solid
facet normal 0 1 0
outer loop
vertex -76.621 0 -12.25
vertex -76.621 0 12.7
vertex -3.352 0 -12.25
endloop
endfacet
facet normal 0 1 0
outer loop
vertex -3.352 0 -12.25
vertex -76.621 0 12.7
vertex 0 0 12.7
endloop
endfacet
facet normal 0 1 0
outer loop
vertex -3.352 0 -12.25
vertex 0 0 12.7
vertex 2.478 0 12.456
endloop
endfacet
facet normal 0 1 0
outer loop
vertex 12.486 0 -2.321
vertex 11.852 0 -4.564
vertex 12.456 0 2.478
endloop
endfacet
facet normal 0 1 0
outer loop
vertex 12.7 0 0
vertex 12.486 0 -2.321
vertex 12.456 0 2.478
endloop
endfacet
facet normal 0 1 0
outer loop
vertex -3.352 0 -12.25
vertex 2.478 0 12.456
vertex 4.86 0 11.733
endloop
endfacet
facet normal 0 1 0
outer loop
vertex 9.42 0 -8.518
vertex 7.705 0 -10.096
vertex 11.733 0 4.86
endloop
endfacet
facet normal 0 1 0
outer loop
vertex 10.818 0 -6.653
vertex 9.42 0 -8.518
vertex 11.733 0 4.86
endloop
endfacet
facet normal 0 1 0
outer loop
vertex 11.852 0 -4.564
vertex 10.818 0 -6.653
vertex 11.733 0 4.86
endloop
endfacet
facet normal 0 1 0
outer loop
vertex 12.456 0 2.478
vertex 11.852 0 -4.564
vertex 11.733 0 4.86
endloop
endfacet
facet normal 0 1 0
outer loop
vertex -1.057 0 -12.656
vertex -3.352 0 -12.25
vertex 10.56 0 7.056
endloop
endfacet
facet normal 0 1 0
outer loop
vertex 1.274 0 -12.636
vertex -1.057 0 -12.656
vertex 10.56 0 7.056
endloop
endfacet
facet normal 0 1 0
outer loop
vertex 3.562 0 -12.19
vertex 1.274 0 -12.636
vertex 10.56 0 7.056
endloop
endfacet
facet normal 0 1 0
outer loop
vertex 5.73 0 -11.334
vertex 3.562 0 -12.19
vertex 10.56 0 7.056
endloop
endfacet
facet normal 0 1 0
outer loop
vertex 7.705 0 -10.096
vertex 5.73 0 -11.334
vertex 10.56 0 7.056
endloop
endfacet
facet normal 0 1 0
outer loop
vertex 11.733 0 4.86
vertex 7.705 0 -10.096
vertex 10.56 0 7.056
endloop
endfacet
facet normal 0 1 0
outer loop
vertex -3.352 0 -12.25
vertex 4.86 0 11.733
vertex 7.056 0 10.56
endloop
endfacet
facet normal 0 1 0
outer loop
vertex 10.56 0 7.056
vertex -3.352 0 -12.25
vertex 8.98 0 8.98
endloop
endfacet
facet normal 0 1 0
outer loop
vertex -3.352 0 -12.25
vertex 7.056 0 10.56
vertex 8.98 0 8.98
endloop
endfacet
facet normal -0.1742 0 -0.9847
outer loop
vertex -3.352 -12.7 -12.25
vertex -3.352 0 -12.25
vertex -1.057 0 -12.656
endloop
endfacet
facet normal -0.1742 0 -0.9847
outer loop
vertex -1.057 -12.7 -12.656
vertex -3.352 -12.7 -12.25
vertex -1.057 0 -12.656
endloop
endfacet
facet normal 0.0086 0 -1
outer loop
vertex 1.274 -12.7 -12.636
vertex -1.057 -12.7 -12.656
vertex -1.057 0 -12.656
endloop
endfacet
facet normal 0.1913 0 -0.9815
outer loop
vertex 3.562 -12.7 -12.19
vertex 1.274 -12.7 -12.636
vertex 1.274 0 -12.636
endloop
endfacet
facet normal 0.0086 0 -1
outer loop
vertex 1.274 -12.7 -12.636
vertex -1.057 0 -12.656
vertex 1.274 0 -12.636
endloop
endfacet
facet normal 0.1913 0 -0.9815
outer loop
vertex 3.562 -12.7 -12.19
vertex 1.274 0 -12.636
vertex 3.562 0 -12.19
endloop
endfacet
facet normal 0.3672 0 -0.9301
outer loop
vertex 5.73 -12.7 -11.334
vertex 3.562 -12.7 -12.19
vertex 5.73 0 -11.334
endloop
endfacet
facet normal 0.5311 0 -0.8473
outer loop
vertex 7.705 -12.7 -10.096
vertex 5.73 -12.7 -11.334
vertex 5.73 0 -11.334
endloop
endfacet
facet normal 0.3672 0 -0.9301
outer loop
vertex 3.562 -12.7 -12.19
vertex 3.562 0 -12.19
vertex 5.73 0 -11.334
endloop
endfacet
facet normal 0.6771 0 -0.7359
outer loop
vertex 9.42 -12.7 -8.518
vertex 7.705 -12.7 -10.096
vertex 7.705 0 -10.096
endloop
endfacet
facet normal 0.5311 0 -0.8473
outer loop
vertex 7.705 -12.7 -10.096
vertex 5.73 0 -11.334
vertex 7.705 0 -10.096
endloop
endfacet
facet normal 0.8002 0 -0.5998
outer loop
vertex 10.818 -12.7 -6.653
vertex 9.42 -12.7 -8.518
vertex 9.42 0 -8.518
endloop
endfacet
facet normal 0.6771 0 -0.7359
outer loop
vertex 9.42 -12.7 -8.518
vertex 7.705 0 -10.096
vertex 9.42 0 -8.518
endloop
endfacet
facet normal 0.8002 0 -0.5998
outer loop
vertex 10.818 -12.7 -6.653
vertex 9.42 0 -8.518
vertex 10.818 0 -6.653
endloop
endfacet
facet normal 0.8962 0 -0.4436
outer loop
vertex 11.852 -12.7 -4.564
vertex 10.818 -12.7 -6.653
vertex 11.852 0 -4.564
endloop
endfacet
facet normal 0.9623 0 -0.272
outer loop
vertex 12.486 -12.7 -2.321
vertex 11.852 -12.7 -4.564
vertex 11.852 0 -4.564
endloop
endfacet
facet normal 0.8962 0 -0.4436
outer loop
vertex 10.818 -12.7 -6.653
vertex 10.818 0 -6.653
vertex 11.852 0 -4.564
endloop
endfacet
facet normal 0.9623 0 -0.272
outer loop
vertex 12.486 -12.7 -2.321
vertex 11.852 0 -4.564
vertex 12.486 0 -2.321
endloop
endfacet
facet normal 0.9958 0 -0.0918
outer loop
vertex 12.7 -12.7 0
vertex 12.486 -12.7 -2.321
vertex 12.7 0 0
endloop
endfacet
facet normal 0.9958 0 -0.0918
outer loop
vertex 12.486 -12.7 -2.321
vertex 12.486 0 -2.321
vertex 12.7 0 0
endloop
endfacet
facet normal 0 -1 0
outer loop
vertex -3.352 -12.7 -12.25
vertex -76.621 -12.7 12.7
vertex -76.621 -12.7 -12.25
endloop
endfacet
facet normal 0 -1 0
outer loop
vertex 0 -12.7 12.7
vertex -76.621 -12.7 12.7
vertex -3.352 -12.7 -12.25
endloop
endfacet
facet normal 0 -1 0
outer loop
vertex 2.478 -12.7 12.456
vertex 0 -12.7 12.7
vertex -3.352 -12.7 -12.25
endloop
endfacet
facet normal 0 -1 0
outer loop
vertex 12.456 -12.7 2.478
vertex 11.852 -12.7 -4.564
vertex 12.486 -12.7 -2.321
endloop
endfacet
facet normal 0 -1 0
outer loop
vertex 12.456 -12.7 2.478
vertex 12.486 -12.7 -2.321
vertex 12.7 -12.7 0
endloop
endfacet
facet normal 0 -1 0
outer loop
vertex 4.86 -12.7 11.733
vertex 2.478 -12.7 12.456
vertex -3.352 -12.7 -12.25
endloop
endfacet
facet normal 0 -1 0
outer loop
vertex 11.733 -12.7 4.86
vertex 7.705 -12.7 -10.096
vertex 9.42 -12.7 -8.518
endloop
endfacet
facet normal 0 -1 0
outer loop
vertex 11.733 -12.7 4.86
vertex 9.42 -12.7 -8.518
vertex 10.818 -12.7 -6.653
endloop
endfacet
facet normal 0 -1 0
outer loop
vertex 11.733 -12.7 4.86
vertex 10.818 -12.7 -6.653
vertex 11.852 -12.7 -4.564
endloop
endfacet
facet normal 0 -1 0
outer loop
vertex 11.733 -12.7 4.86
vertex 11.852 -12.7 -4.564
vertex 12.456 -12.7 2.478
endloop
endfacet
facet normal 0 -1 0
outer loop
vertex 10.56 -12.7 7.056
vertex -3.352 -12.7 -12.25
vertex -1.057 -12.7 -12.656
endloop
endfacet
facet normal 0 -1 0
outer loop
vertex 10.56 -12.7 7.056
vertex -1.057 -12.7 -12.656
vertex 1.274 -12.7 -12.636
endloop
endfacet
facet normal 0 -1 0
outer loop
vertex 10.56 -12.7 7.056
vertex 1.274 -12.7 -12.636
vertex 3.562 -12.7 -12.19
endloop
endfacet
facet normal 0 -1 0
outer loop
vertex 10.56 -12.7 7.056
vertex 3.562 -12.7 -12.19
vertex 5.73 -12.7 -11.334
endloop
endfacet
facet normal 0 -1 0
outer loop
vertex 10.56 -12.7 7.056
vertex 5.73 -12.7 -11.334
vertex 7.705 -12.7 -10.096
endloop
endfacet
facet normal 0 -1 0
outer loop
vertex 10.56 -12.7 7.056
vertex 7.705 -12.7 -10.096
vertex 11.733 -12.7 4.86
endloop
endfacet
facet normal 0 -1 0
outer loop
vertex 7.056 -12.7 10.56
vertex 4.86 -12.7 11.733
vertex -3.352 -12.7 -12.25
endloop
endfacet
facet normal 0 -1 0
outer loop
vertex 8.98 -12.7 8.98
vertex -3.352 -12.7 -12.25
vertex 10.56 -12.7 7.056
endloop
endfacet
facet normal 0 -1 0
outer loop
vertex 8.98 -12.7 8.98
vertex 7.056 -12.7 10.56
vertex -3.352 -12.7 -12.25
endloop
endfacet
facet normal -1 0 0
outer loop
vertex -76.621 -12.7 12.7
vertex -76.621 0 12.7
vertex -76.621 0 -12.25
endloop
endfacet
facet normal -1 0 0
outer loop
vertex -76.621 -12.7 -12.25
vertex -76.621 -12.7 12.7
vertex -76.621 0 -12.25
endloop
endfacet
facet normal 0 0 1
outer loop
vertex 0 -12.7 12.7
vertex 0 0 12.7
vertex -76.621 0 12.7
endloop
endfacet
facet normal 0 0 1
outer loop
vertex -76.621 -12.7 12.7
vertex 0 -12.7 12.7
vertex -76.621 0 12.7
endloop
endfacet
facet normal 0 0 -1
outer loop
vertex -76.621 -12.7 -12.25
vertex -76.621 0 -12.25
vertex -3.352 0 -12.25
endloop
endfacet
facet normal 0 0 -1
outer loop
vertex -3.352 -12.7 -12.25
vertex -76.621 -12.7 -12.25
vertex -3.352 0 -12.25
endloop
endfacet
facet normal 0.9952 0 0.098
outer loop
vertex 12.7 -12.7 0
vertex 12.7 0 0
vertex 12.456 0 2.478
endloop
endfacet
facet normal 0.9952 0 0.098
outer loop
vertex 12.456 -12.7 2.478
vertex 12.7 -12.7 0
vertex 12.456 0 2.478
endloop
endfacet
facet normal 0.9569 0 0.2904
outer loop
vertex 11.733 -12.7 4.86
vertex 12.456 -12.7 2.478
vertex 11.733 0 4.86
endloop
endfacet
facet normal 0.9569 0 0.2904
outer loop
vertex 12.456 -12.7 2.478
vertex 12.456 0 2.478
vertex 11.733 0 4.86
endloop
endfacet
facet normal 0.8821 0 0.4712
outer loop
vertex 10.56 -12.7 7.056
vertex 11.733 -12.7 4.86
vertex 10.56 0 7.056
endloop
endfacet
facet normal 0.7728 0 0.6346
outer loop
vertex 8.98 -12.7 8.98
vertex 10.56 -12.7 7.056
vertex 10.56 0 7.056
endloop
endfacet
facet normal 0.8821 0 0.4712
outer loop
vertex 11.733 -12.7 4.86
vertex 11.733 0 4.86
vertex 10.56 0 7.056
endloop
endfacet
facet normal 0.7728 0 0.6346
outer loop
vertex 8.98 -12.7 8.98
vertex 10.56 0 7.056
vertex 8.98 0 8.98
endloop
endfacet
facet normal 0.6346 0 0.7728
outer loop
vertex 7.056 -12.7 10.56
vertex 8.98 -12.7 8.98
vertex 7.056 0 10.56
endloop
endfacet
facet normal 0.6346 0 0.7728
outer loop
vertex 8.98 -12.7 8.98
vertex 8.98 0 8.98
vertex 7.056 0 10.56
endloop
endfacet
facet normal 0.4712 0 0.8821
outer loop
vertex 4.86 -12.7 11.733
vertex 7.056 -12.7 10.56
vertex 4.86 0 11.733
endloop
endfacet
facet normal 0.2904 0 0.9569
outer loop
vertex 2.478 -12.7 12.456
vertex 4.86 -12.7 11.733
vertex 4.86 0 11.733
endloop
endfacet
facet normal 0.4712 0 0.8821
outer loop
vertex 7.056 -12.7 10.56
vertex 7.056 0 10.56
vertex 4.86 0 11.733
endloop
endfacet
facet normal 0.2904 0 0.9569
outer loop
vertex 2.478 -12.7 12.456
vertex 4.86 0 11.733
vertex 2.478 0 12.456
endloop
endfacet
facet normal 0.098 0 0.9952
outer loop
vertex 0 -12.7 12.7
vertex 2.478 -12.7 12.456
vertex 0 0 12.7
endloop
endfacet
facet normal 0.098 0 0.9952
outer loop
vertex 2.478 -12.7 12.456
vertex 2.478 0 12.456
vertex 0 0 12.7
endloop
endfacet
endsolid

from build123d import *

# Parameters (mm, degrees)
F1_DEPTH = 12.7


with BuildPart() as f1:
    # F0 (on Front) → F1 (new body)
    with BuildSketch(Plane.XZ):
        with BuildLine():
            ThreePointArc((-3.351711, -12.249736), (-12.586931, 1.69091), (0, 12.7))
            Line((0, 12.7), (-76.620914, 12.7))
            Line((-76.620914, 12.7), (-76.620914, -12.249736))
            Line((-76.620914, -12.249736), (-3.351711, -12.249736))
        make_face()
        with BuildLine():
            Line((0, -12.249736), (0, 12.7))
            ThreePointArc((0, 12.7), (-12.586931, 1.69091), (-3.351711, -12.249736))
            Line((-3.351711, -12.249736), (0, -12.249736))
        make_face()
        with BuildLine():
            ThreePointArc((-3.351711, -12.249736), (7.70465, -10.095958), (12.7, 0))
            ThreePointArc((12.7, 0), (8.980256, 8.980256), (0, 12.7))
            Line((0, 12.7), (0, -12.249736))
            Line((0, -12.249736), (-3.351711, -12.249736))
        make_face()
    extrude(amount=F1_DEPTH)


solid = f1.part
